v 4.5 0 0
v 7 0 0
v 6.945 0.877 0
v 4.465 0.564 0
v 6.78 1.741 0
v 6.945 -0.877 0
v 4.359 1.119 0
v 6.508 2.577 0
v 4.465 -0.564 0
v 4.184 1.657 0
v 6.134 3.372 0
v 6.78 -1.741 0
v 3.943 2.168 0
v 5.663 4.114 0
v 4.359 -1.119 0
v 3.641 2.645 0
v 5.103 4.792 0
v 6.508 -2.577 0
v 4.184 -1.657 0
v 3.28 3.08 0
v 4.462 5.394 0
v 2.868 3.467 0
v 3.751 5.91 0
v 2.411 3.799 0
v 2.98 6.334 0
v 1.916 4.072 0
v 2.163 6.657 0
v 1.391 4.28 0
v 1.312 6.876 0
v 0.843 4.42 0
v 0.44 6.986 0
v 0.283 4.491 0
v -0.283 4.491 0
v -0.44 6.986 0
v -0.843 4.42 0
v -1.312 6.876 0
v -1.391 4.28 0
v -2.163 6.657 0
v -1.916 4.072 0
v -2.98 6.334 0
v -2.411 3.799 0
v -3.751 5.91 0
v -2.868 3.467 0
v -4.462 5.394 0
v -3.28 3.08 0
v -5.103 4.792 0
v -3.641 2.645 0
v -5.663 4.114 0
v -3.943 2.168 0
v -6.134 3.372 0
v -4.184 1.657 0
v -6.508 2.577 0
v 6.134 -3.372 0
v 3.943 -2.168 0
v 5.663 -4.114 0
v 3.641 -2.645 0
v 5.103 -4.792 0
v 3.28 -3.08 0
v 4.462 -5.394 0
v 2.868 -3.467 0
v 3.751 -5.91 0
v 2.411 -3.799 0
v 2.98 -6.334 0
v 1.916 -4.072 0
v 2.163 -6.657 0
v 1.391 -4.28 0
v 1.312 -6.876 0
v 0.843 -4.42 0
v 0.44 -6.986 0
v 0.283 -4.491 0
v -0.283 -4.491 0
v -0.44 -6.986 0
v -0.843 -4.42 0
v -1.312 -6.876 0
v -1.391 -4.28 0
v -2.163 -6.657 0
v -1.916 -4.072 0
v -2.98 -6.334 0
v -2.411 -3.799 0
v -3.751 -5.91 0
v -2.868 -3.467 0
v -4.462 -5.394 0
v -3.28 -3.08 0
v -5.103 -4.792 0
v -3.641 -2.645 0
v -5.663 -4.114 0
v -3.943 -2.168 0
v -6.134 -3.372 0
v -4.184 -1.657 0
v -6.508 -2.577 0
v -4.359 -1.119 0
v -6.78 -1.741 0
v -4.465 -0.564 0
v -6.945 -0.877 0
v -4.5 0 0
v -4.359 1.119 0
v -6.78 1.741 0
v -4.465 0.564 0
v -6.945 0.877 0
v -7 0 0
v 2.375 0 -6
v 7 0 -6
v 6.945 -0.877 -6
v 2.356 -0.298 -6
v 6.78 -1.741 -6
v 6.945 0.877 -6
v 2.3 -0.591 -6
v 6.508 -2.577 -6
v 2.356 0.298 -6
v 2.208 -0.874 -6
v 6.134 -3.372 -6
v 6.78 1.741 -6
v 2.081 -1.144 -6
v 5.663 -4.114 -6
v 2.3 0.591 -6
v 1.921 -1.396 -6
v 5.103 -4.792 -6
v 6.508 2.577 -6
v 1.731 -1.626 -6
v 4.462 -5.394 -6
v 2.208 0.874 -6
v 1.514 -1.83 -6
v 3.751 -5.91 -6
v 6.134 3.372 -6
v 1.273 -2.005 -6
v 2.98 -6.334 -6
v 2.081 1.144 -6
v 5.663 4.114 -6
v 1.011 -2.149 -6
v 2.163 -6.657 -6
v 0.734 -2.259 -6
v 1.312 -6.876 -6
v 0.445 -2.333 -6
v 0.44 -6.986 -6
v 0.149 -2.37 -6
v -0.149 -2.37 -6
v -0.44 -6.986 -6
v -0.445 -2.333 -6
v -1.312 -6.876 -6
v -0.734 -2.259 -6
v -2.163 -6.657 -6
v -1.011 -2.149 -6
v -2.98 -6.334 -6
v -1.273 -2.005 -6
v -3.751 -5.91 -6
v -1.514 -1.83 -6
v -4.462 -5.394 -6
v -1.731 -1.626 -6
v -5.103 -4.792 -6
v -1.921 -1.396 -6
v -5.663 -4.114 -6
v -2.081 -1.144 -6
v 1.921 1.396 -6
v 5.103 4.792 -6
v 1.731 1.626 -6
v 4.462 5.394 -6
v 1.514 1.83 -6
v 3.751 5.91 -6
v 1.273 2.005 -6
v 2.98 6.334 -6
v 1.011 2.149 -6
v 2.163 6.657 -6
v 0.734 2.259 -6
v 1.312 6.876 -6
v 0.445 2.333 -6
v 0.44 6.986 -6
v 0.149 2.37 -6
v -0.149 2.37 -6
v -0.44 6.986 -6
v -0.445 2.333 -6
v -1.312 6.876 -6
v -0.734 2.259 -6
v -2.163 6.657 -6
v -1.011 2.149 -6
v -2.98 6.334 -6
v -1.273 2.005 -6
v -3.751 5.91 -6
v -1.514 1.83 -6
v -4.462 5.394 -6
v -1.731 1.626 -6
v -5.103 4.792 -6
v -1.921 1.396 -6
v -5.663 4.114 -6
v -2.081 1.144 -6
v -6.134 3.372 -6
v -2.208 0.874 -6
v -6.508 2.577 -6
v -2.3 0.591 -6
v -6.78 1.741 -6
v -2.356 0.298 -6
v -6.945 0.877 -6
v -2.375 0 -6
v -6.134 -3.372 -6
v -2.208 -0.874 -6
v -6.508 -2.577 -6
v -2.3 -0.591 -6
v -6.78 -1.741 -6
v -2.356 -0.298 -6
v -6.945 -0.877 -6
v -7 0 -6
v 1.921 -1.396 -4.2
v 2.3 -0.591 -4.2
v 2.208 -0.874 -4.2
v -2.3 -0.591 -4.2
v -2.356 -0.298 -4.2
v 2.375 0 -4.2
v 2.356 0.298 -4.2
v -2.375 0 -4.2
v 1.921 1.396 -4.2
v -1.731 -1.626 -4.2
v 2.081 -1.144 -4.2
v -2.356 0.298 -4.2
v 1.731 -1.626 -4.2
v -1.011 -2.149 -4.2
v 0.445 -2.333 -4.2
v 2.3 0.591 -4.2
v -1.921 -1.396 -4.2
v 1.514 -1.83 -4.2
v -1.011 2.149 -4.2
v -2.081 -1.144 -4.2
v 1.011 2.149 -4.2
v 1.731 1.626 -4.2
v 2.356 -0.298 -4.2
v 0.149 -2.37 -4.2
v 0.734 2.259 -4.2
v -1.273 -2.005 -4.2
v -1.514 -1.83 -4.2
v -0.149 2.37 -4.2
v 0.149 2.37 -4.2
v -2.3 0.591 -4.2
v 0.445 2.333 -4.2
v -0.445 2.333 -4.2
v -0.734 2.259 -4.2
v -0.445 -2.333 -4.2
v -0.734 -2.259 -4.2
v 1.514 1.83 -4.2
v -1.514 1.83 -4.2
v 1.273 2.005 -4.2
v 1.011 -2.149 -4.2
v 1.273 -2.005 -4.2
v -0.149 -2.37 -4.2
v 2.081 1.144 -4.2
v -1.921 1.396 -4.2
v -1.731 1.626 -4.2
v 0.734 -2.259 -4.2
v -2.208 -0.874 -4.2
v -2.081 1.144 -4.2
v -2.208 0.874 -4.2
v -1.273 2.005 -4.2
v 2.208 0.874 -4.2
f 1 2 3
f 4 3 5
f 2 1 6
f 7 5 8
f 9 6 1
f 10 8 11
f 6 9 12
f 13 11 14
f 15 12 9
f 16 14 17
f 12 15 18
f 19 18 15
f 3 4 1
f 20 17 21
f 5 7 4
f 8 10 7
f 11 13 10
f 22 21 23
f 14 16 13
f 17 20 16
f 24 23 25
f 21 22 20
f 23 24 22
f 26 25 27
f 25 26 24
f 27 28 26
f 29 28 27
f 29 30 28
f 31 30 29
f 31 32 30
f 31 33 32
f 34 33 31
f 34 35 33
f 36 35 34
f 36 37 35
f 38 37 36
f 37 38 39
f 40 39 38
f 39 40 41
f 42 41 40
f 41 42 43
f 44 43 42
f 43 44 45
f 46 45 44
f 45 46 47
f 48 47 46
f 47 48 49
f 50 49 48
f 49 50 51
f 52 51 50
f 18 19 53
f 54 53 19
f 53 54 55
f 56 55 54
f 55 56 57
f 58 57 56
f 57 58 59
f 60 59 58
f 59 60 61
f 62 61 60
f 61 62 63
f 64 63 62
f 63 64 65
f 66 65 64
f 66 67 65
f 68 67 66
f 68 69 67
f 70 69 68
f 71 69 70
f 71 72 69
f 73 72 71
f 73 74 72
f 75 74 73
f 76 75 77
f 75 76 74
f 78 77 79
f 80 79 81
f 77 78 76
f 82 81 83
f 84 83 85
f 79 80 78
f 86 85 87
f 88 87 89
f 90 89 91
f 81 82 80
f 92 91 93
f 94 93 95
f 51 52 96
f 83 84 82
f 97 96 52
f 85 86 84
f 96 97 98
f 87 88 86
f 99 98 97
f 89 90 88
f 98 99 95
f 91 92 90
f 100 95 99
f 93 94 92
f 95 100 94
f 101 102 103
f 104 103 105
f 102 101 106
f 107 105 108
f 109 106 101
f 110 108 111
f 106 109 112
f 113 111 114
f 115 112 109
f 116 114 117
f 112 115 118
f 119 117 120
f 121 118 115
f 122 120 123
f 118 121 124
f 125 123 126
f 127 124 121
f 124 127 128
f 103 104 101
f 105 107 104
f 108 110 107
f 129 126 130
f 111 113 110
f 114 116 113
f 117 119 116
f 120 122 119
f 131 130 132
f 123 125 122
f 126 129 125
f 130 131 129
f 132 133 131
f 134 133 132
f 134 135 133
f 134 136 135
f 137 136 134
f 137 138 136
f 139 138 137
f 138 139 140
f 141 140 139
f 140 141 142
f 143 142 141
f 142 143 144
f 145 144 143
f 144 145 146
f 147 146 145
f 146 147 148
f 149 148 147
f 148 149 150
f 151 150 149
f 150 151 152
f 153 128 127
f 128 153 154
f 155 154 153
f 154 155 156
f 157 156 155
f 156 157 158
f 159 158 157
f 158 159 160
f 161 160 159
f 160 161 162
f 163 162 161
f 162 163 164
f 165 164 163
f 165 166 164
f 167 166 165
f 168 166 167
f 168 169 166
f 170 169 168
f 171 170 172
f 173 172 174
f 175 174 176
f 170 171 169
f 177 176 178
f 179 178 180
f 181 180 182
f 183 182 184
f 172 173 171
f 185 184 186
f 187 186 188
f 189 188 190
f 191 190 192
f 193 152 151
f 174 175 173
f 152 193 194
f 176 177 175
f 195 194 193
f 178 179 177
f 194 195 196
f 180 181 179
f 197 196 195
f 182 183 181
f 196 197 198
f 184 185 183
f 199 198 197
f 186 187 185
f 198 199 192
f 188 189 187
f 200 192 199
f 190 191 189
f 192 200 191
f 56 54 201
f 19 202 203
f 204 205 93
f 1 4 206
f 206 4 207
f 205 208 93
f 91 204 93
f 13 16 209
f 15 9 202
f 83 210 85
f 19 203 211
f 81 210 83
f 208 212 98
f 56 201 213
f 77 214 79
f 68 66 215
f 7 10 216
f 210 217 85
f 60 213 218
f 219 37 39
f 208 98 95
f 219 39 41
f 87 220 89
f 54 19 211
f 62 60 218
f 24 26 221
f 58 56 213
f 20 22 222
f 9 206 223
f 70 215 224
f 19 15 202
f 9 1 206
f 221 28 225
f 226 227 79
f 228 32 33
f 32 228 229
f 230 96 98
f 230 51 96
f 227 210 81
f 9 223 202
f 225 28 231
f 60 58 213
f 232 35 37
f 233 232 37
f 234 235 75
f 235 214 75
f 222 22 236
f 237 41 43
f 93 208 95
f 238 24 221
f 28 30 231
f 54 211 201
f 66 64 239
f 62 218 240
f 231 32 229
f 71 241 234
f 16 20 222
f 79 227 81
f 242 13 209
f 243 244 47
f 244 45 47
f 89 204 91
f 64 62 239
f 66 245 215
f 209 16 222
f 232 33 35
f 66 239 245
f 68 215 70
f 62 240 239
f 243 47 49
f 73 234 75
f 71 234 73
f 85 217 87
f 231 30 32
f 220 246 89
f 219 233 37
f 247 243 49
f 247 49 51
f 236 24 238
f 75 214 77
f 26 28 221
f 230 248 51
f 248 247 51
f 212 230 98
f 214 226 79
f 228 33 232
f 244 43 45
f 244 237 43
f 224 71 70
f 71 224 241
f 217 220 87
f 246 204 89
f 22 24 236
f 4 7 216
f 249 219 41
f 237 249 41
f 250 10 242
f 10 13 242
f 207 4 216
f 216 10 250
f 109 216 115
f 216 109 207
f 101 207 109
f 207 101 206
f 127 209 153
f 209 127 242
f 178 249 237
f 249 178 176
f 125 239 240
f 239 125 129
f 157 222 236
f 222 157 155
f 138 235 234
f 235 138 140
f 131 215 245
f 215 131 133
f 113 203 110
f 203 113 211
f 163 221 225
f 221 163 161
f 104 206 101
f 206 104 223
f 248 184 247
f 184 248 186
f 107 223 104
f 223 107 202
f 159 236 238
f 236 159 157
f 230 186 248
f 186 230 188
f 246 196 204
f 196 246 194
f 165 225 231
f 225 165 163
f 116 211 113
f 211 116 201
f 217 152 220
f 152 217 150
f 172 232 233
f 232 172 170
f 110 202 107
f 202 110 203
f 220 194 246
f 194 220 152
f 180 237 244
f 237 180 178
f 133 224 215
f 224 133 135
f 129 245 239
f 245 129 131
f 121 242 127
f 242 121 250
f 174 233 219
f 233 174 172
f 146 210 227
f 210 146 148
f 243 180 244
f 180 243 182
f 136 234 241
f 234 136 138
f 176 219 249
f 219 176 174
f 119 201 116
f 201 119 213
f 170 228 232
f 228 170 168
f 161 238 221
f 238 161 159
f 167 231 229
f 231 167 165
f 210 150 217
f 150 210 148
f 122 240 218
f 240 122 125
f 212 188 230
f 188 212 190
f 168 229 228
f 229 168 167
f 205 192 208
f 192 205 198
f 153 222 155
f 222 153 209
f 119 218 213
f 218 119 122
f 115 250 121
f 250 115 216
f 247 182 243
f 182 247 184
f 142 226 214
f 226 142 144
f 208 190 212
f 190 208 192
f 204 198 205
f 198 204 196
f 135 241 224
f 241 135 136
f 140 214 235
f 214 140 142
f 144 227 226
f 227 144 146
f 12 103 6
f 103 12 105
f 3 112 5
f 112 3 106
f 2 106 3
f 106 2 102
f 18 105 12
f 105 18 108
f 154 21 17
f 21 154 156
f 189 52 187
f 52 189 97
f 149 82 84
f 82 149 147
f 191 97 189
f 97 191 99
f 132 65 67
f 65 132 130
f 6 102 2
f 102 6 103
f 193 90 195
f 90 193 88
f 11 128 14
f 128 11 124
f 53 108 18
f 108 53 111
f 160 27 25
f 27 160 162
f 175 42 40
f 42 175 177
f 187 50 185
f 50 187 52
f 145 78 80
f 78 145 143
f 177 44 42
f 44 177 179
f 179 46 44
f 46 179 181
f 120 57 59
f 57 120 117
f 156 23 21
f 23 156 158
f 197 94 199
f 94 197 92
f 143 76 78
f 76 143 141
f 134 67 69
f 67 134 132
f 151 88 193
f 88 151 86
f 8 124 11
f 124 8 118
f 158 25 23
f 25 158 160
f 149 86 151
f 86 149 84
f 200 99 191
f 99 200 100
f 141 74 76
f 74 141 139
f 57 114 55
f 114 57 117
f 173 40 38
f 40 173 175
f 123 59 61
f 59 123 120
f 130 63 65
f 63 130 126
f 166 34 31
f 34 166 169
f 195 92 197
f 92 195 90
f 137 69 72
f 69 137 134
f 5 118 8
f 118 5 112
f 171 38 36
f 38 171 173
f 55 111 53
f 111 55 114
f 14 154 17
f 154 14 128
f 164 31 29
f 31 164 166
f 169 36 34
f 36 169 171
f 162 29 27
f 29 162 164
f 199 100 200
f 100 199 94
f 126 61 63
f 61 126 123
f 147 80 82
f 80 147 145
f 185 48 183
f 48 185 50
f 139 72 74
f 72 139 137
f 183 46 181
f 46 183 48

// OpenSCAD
$fn = 50;


difference() {
	union() {
		translate(v = [0, 0, -6.0000000000]) {
			cylinder(h = 6, r = 7.0000000000);
		}
		cylinder(h = 0, r = 16.0000000000);
	}
	union() {
		translate(v = [0, 0, 0]) {
			rotate(a = [0, 0, 0]) {
				difference() {
					union() {
						#translate(v = [0, 0, -6.0000000000]) {
							cylinder(h = 6, r = 2.2500000000);
						}
						#translate(v = [0, 0, -4.2000000000]) {
							cylinder(h = 4.2000000000, r = 7.0000000000, r1 = 2.3750000000, r2 = 4.5000000000);
						}
						#translate(v = [0, 0, -6.0000000000]) {
							cylinder(h = 6, r = 2.3750000000);
						}
						#translate(v = [0, 0, -6.0000000000]) {
							cylinder(h = 6, r = 2.2500000000);
						}
					}
					union();
				}
			}
		}
	}
}
